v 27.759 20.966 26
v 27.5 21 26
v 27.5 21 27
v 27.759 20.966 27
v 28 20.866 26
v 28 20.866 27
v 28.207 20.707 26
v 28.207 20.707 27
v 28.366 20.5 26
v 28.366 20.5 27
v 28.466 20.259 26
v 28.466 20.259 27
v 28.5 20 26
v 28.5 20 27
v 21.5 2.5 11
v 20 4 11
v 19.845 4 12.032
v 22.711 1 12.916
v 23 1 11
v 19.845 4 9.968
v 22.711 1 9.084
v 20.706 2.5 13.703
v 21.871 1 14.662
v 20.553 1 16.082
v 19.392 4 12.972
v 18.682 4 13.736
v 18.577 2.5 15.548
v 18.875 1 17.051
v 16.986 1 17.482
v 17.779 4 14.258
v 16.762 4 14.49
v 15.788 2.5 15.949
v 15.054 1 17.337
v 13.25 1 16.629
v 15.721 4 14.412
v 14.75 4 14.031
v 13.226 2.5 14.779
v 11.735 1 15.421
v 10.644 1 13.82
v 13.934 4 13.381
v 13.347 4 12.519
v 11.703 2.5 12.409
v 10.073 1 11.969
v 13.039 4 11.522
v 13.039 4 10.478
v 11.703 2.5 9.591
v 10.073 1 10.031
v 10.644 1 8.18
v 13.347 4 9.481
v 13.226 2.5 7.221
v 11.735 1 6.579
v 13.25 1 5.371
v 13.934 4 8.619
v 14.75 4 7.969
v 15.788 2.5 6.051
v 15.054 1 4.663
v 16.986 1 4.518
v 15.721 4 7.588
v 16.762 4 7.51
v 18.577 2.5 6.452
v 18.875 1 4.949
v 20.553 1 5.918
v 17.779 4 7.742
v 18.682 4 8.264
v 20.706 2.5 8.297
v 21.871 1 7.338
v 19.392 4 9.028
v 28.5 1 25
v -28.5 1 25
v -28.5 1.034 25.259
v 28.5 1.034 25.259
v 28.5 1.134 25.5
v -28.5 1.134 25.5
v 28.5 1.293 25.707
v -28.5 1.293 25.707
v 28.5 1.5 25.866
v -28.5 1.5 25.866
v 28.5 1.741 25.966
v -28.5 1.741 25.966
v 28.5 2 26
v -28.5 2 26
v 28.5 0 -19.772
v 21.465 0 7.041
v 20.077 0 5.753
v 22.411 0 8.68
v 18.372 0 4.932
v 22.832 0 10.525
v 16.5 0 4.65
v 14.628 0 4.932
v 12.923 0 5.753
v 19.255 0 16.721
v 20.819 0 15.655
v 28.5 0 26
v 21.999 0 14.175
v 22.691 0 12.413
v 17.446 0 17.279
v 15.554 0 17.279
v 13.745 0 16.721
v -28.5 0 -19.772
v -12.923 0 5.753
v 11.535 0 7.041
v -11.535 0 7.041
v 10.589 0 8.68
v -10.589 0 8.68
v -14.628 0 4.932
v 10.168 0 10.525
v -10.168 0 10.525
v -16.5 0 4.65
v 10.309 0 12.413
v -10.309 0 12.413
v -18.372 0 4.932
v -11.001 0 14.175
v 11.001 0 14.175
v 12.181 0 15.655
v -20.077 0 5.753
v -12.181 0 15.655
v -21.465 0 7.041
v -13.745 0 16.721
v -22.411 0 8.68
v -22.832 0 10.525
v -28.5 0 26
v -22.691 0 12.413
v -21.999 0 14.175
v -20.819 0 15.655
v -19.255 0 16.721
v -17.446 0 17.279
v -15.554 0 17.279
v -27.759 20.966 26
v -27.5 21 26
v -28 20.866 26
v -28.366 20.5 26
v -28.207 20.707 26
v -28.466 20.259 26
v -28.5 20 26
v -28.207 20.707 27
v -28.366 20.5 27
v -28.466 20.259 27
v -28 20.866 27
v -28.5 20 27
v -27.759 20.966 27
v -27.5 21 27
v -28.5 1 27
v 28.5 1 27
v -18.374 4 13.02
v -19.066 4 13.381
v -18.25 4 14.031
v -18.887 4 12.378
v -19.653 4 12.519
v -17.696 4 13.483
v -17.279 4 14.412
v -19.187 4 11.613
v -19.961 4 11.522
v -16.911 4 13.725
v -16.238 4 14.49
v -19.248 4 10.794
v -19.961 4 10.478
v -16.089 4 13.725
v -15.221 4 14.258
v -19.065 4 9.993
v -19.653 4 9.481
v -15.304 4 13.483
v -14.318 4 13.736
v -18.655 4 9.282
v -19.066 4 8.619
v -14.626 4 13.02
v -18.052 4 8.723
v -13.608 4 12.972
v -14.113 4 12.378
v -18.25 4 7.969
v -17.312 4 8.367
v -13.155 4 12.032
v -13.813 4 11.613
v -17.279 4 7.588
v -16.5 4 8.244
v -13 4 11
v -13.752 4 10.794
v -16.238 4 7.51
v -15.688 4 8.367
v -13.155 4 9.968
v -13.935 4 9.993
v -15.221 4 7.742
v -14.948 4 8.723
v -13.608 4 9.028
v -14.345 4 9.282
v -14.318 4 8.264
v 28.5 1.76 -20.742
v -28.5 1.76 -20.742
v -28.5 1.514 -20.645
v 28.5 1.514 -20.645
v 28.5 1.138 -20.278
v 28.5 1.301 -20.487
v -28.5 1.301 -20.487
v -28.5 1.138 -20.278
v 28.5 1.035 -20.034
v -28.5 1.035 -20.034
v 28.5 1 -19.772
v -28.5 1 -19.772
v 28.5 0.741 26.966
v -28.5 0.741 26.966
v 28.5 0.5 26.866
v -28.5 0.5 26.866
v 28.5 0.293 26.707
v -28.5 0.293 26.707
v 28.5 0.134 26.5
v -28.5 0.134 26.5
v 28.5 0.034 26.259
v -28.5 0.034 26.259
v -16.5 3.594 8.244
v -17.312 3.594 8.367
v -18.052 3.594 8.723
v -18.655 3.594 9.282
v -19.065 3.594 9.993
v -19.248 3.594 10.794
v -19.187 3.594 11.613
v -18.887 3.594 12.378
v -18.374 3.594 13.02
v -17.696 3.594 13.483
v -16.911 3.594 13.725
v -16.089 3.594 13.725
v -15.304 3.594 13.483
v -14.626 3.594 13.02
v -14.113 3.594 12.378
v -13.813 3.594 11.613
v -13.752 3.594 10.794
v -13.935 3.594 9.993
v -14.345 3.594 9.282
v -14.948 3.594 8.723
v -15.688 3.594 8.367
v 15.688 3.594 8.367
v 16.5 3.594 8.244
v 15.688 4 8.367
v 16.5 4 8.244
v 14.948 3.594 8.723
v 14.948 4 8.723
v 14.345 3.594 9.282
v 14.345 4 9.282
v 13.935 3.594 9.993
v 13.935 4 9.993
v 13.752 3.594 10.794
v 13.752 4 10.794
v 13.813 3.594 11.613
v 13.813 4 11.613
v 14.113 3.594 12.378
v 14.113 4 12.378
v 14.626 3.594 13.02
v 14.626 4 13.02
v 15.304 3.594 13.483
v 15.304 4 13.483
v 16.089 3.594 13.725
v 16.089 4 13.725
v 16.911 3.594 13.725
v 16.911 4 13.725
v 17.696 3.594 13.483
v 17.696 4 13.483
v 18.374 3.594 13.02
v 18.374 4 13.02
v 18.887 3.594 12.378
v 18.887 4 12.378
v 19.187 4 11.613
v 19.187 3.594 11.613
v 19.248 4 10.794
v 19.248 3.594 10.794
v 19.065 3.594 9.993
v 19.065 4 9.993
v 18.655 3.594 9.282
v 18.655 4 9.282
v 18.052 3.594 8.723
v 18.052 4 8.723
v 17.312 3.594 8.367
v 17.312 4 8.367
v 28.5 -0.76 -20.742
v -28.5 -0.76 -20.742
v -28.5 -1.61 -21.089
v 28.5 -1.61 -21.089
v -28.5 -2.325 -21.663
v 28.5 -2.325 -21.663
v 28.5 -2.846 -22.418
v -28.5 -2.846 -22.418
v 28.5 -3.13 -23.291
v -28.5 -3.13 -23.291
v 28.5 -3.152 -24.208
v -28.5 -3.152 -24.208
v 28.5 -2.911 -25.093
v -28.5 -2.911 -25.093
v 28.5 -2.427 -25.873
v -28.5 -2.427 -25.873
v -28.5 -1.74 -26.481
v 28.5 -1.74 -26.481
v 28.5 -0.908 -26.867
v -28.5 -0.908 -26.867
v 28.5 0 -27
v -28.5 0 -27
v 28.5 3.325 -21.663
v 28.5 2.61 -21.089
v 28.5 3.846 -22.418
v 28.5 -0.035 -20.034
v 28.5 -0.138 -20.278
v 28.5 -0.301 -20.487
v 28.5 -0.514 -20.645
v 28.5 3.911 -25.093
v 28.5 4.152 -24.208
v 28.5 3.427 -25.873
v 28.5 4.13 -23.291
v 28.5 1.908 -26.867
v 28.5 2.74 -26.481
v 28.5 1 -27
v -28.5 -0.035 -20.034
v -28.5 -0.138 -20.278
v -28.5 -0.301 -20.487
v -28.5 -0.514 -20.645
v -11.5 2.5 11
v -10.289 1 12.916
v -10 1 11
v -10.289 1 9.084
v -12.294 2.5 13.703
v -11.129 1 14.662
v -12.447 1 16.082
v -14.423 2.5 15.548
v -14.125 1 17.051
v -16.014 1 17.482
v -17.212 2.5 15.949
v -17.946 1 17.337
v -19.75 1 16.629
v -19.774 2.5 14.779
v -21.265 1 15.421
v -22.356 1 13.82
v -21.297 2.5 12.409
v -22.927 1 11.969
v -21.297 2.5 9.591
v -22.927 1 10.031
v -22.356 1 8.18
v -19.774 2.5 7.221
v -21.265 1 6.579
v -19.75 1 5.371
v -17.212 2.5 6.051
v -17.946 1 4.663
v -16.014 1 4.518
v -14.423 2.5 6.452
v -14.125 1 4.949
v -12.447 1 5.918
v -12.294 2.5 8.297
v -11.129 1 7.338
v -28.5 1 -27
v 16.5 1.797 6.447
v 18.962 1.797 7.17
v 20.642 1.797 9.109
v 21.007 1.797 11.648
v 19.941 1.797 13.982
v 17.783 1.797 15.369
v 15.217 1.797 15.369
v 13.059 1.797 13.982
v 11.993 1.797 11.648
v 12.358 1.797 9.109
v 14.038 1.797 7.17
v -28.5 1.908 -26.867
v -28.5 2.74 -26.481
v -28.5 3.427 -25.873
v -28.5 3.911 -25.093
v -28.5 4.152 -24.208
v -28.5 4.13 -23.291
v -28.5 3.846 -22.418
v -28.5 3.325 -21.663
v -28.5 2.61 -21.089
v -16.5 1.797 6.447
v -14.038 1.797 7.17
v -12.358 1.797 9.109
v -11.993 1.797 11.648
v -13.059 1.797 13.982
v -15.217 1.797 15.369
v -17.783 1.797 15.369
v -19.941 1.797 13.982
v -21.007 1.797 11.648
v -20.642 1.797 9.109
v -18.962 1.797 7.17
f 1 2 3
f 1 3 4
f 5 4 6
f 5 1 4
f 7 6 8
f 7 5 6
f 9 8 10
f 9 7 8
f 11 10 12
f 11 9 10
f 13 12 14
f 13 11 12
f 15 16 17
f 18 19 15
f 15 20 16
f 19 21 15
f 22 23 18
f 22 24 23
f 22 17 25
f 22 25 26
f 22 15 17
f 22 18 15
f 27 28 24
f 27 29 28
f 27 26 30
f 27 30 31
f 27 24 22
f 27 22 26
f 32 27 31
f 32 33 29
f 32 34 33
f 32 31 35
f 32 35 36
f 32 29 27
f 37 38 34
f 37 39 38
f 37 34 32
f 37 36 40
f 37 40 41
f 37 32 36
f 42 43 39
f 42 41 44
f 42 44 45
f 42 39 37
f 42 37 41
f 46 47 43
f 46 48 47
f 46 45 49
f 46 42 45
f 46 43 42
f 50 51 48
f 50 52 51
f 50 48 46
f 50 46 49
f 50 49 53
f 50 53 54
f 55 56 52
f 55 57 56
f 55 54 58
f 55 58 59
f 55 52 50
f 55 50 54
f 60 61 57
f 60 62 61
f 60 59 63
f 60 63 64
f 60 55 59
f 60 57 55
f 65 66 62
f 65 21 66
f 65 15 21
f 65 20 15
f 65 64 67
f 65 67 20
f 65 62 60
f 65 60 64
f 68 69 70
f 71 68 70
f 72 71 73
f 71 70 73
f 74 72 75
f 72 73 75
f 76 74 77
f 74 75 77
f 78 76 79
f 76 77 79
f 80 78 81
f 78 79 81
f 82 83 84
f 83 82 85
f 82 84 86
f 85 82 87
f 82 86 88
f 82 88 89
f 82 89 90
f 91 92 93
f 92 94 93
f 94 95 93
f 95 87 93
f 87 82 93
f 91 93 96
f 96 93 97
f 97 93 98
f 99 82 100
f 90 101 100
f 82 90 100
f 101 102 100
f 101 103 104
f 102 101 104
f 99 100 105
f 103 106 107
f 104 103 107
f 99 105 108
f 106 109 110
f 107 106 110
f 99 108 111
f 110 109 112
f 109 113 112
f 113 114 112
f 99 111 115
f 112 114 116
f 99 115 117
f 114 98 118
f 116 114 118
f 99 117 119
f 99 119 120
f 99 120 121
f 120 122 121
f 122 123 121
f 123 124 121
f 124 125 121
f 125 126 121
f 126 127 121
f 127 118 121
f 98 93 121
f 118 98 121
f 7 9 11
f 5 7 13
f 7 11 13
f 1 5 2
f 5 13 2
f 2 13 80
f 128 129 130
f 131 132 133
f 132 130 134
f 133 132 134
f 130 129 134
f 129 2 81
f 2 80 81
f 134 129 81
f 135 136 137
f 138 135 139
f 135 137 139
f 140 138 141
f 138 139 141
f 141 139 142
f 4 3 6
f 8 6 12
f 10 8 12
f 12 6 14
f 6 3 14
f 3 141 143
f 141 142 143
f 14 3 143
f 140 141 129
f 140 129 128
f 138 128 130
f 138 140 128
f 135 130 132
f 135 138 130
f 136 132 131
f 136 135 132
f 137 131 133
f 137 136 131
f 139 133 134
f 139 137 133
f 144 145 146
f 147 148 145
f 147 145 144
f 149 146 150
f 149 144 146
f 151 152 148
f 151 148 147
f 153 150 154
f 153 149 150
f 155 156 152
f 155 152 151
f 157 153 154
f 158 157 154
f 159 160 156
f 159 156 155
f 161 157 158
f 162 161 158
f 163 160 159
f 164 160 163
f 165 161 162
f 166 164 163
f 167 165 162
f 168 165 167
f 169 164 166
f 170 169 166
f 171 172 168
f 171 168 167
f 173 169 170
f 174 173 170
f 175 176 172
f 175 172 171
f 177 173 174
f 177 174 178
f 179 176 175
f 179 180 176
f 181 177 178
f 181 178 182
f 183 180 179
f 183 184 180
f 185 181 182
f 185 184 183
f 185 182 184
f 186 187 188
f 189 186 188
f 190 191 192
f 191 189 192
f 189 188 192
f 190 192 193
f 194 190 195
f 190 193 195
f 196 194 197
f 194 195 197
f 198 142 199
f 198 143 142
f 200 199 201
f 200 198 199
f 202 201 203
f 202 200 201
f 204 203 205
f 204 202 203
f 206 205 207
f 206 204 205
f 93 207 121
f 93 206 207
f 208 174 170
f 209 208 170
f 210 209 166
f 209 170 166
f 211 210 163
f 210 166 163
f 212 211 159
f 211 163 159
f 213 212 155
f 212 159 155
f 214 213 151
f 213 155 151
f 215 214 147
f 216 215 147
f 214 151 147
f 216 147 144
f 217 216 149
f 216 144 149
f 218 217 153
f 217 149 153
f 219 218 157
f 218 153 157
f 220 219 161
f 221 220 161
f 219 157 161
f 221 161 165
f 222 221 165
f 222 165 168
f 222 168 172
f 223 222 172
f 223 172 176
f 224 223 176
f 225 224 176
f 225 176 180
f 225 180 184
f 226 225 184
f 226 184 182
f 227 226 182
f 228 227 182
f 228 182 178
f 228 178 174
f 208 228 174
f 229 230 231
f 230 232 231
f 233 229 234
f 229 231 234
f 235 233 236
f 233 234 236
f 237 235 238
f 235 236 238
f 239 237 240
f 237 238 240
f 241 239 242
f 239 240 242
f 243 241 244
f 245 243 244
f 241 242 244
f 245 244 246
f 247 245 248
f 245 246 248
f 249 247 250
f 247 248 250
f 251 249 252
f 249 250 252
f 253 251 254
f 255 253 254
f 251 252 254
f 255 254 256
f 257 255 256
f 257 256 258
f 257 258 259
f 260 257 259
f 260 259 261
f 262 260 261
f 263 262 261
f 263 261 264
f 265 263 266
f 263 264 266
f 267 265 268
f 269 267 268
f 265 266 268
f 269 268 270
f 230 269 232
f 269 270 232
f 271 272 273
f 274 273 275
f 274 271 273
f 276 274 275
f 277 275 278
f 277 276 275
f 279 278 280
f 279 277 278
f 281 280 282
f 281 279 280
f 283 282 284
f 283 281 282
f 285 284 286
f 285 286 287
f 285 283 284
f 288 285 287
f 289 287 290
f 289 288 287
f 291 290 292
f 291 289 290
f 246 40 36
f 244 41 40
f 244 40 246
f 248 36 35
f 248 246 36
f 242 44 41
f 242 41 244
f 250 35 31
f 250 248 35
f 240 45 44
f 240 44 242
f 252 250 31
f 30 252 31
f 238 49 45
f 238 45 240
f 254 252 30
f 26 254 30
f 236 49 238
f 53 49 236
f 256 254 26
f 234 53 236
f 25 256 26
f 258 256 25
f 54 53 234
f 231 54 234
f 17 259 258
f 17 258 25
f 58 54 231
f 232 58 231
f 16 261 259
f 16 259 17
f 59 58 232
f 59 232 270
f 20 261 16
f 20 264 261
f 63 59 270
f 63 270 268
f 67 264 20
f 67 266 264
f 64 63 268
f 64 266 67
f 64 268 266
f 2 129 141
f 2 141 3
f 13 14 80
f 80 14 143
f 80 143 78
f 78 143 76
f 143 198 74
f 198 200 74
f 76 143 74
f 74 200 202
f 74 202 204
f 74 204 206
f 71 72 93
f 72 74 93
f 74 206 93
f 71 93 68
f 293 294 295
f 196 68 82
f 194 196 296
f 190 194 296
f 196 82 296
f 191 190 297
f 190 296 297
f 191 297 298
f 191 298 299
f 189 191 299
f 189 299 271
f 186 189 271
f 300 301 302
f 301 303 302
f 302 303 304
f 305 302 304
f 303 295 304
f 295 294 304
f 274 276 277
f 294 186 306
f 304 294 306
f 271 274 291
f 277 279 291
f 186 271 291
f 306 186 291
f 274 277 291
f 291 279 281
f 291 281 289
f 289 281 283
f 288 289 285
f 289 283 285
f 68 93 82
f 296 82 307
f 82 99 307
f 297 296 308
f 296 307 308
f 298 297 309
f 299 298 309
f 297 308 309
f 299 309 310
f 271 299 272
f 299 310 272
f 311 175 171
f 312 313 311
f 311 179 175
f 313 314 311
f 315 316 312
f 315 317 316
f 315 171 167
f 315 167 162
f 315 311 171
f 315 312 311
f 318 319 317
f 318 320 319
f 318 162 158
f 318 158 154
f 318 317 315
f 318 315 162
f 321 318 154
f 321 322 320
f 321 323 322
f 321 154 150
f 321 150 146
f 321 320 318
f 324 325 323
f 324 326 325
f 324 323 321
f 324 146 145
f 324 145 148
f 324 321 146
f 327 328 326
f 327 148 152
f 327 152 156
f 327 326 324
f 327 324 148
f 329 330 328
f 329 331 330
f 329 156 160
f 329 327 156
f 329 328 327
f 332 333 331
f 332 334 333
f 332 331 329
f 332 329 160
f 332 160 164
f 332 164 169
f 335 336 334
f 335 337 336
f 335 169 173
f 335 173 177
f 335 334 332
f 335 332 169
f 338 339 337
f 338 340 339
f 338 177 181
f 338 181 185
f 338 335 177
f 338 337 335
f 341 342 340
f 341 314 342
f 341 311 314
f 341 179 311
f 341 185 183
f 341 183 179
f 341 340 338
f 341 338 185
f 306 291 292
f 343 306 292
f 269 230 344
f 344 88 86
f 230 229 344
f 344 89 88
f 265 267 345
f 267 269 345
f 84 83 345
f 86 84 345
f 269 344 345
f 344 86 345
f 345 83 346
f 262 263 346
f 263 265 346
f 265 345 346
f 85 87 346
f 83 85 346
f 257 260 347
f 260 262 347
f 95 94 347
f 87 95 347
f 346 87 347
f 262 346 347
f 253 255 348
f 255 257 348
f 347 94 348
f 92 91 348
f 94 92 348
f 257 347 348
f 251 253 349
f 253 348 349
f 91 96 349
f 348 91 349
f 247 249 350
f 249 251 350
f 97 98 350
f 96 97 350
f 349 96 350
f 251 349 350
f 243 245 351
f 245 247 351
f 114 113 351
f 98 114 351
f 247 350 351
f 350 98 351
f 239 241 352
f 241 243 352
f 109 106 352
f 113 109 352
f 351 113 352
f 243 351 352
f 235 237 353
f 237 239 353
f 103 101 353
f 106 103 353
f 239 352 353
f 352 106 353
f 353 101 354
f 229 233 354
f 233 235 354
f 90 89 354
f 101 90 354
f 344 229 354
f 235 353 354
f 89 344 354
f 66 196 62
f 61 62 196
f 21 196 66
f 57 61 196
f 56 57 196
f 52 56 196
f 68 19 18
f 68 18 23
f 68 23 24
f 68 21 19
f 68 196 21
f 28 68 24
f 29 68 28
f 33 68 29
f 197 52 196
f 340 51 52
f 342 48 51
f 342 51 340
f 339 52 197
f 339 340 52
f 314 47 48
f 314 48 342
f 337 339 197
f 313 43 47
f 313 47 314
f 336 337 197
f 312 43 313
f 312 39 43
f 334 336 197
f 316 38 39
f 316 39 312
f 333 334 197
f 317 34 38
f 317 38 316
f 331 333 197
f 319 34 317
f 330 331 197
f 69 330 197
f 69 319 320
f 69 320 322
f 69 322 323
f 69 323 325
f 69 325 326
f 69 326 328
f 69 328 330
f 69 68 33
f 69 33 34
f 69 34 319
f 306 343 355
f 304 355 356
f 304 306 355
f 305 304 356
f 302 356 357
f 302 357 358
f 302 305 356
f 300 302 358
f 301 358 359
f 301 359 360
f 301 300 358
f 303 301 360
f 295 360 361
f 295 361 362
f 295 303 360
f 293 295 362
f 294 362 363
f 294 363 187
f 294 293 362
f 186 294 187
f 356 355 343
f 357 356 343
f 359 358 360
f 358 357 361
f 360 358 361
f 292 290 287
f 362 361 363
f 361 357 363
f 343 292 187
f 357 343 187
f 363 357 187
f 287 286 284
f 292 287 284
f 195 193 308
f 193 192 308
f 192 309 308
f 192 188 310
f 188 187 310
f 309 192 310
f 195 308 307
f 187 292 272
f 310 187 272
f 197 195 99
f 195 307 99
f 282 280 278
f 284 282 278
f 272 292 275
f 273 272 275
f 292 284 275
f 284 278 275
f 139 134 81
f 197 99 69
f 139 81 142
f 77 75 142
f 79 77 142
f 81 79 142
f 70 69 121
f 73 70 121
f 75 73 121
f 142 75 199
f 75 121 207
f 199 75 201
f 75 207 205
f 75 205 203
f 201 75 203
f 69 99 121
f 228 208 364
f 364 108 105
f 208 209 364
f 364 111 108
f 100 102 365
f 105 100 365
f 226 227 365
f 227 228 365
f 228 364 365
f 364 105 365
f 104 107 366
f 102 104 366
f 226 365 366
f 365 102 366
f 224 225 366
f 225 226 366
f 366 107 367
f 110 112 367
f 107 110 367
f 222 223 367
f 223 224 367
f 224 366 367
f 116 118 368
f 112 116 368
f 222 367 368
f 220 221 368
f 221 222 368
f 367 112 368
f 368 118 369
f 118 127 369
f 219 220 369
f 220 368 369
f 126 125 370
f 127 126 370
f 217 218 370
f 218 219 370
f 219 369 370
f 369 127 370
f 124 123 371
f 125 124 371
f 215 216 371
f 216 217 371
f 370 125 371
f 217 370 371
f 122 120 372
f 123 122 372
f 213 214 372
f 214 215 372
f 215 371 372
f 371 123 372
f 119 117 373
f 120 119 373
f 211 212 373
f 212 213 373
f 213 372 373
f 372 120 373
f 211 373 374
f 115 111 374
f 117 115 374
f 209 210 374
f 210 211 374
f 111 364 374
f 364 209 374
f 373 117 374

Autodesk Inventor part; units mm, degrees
ref_plane "YZ Plane" through (0, 0, 0) normal (1, 0, 0) x (0, 1, 0)
ref_plane "XZ Plane" through (0, 0, 0) normal (0, 1, 0) x (-1, 0, 0)
ref_plane "XY Plane" through (0, 0, 0) normal (0, 0, 1) x (1, 0, 0)
sketch "Sketch1" plane through (0, 0, 0) normal (0, 1, 0) x (-1, 0, 0)
  line L0 (28.5, 27) -> (-28.5, 27)
  line L1 (-28.5, 27) -> (-28.5, -27)
  line L2 (-28.5, -27) -> (28.5, -27)
  line L3 (28.5, -27) -> (28.5, 27)
  line L4 (28.5, 27) -> (-28.5, -27) construction
  line L5 (-28.5, 27) -> (28.5, -27) construction
  point P0 (0, 0)
  dimension "d0" = 57
  dimension "d1" = 54
extrude "Extrusion1" add sketch "Sketch1" along normal blind 1
sketch "Sketch2" plane through (0, 1, 0) normal (0, 1, 0) x (1, 0, 0)
  line L0 (-28.5, 27) -> (-28.5, -27) projected
  line L1 (28.5, -27) -> (28.5, 27) projected
  line L2 (-28.5, -27) -> (28.5, -27)
  line L3 (28.5, -27) -> (28.5, -26)
  line L4 (28.5, -26) -> (-28.5, -26)
  line L5 (-28.5, -26) -> (-28.5, -27)
  point P0 (0, 0)
  point P1 (-28.5, -26)
  dimension "d4" = 1
extrude "Extrusion2" add sketch "Sketch2" along normal blind 20
sketch "Sketch3" plane through (0, 1, 0) normal (0, 1, 0) x (1, 0, 0)
  line L0 (-28.5, 27) -> (-28.5, -27) projected
  line L1 (-28.5, -11) -> (28.5, -11) construction
  line L2 (28.5, -27) -> (28.5, 27) projected
  line L3 (28.5, -26) -> (-28.5, -26) projected
  line L4 (0, -26) -> (0, 22.5) construction
  circle A0 centre (-16.5, -11) radius 6.5
  circle A1 centre (16.5, -11) radius 6.5
  point P0 (0, 0)
  dimension "d7" = 15
  dimension "d8" = 13
  dimension "d9" = 12
extrude "Extrusion3" add sketch "Sketch3" along normal blind 3 draft -45
sketch "Sketch4" plane through (0, 0, 0) normal (0, -1, 0) x (1, 0, 0)
  circle A0 centre (16.5, 11) radius 3.5 projected
  circle A1 centre (-16.5, 11) radius 3.5 projected
  circle A2 centre (16.5, 11) radius 3.5 projected
  circle A3 centre (-16.5, 11) radius 3.5 projected
  point P0 (0, 0)
hole "Hole1" at (16.5, 0, 11) at (-16.5, 0, 11) direction (0, 1, 0) diameter 5.5118 end through all countersink diameter 12.7 countersink angle 90 clearance for "Flat Head Machine Screw" size "M5" standard "Ansi Metric M Profile"
fillet "Fillet1" radius 1 2 edges at (0, 1, 26) (0, 0, 27)
sketch "Sketch5" plane through (28.5, 0, 26) normal (1, 0, 0) x (0, 0, -1)
  line L0 (53, 1) -> (1, 1) projected
  arc A0 (53, 1) -> (46.65, 1) centre (49.825, 1) ccw
  line L1 (53, 0) -> (0, 0) projected
  arc A1 (46.65, 0) -> (53, 0) centre (49.825, 0) ccw
  point P0 (26, 0)
  dimension "d20" = 6.35
  dimension "d24" = 6.35
extrude "Extrusion4" add sketch "Sketch5" against normal up to surface (57 mm away)
fillet "Fillet2" radius 1 6 edges at (0, 1, -20.65) (0, 1, -27) (0, 0, -27) (28.5, 21, 26.5) (-28.5, 21, 26.5) (0, 0, -20.65)
equation "\"d24\" = d20"
properties part number "Handle V1"
